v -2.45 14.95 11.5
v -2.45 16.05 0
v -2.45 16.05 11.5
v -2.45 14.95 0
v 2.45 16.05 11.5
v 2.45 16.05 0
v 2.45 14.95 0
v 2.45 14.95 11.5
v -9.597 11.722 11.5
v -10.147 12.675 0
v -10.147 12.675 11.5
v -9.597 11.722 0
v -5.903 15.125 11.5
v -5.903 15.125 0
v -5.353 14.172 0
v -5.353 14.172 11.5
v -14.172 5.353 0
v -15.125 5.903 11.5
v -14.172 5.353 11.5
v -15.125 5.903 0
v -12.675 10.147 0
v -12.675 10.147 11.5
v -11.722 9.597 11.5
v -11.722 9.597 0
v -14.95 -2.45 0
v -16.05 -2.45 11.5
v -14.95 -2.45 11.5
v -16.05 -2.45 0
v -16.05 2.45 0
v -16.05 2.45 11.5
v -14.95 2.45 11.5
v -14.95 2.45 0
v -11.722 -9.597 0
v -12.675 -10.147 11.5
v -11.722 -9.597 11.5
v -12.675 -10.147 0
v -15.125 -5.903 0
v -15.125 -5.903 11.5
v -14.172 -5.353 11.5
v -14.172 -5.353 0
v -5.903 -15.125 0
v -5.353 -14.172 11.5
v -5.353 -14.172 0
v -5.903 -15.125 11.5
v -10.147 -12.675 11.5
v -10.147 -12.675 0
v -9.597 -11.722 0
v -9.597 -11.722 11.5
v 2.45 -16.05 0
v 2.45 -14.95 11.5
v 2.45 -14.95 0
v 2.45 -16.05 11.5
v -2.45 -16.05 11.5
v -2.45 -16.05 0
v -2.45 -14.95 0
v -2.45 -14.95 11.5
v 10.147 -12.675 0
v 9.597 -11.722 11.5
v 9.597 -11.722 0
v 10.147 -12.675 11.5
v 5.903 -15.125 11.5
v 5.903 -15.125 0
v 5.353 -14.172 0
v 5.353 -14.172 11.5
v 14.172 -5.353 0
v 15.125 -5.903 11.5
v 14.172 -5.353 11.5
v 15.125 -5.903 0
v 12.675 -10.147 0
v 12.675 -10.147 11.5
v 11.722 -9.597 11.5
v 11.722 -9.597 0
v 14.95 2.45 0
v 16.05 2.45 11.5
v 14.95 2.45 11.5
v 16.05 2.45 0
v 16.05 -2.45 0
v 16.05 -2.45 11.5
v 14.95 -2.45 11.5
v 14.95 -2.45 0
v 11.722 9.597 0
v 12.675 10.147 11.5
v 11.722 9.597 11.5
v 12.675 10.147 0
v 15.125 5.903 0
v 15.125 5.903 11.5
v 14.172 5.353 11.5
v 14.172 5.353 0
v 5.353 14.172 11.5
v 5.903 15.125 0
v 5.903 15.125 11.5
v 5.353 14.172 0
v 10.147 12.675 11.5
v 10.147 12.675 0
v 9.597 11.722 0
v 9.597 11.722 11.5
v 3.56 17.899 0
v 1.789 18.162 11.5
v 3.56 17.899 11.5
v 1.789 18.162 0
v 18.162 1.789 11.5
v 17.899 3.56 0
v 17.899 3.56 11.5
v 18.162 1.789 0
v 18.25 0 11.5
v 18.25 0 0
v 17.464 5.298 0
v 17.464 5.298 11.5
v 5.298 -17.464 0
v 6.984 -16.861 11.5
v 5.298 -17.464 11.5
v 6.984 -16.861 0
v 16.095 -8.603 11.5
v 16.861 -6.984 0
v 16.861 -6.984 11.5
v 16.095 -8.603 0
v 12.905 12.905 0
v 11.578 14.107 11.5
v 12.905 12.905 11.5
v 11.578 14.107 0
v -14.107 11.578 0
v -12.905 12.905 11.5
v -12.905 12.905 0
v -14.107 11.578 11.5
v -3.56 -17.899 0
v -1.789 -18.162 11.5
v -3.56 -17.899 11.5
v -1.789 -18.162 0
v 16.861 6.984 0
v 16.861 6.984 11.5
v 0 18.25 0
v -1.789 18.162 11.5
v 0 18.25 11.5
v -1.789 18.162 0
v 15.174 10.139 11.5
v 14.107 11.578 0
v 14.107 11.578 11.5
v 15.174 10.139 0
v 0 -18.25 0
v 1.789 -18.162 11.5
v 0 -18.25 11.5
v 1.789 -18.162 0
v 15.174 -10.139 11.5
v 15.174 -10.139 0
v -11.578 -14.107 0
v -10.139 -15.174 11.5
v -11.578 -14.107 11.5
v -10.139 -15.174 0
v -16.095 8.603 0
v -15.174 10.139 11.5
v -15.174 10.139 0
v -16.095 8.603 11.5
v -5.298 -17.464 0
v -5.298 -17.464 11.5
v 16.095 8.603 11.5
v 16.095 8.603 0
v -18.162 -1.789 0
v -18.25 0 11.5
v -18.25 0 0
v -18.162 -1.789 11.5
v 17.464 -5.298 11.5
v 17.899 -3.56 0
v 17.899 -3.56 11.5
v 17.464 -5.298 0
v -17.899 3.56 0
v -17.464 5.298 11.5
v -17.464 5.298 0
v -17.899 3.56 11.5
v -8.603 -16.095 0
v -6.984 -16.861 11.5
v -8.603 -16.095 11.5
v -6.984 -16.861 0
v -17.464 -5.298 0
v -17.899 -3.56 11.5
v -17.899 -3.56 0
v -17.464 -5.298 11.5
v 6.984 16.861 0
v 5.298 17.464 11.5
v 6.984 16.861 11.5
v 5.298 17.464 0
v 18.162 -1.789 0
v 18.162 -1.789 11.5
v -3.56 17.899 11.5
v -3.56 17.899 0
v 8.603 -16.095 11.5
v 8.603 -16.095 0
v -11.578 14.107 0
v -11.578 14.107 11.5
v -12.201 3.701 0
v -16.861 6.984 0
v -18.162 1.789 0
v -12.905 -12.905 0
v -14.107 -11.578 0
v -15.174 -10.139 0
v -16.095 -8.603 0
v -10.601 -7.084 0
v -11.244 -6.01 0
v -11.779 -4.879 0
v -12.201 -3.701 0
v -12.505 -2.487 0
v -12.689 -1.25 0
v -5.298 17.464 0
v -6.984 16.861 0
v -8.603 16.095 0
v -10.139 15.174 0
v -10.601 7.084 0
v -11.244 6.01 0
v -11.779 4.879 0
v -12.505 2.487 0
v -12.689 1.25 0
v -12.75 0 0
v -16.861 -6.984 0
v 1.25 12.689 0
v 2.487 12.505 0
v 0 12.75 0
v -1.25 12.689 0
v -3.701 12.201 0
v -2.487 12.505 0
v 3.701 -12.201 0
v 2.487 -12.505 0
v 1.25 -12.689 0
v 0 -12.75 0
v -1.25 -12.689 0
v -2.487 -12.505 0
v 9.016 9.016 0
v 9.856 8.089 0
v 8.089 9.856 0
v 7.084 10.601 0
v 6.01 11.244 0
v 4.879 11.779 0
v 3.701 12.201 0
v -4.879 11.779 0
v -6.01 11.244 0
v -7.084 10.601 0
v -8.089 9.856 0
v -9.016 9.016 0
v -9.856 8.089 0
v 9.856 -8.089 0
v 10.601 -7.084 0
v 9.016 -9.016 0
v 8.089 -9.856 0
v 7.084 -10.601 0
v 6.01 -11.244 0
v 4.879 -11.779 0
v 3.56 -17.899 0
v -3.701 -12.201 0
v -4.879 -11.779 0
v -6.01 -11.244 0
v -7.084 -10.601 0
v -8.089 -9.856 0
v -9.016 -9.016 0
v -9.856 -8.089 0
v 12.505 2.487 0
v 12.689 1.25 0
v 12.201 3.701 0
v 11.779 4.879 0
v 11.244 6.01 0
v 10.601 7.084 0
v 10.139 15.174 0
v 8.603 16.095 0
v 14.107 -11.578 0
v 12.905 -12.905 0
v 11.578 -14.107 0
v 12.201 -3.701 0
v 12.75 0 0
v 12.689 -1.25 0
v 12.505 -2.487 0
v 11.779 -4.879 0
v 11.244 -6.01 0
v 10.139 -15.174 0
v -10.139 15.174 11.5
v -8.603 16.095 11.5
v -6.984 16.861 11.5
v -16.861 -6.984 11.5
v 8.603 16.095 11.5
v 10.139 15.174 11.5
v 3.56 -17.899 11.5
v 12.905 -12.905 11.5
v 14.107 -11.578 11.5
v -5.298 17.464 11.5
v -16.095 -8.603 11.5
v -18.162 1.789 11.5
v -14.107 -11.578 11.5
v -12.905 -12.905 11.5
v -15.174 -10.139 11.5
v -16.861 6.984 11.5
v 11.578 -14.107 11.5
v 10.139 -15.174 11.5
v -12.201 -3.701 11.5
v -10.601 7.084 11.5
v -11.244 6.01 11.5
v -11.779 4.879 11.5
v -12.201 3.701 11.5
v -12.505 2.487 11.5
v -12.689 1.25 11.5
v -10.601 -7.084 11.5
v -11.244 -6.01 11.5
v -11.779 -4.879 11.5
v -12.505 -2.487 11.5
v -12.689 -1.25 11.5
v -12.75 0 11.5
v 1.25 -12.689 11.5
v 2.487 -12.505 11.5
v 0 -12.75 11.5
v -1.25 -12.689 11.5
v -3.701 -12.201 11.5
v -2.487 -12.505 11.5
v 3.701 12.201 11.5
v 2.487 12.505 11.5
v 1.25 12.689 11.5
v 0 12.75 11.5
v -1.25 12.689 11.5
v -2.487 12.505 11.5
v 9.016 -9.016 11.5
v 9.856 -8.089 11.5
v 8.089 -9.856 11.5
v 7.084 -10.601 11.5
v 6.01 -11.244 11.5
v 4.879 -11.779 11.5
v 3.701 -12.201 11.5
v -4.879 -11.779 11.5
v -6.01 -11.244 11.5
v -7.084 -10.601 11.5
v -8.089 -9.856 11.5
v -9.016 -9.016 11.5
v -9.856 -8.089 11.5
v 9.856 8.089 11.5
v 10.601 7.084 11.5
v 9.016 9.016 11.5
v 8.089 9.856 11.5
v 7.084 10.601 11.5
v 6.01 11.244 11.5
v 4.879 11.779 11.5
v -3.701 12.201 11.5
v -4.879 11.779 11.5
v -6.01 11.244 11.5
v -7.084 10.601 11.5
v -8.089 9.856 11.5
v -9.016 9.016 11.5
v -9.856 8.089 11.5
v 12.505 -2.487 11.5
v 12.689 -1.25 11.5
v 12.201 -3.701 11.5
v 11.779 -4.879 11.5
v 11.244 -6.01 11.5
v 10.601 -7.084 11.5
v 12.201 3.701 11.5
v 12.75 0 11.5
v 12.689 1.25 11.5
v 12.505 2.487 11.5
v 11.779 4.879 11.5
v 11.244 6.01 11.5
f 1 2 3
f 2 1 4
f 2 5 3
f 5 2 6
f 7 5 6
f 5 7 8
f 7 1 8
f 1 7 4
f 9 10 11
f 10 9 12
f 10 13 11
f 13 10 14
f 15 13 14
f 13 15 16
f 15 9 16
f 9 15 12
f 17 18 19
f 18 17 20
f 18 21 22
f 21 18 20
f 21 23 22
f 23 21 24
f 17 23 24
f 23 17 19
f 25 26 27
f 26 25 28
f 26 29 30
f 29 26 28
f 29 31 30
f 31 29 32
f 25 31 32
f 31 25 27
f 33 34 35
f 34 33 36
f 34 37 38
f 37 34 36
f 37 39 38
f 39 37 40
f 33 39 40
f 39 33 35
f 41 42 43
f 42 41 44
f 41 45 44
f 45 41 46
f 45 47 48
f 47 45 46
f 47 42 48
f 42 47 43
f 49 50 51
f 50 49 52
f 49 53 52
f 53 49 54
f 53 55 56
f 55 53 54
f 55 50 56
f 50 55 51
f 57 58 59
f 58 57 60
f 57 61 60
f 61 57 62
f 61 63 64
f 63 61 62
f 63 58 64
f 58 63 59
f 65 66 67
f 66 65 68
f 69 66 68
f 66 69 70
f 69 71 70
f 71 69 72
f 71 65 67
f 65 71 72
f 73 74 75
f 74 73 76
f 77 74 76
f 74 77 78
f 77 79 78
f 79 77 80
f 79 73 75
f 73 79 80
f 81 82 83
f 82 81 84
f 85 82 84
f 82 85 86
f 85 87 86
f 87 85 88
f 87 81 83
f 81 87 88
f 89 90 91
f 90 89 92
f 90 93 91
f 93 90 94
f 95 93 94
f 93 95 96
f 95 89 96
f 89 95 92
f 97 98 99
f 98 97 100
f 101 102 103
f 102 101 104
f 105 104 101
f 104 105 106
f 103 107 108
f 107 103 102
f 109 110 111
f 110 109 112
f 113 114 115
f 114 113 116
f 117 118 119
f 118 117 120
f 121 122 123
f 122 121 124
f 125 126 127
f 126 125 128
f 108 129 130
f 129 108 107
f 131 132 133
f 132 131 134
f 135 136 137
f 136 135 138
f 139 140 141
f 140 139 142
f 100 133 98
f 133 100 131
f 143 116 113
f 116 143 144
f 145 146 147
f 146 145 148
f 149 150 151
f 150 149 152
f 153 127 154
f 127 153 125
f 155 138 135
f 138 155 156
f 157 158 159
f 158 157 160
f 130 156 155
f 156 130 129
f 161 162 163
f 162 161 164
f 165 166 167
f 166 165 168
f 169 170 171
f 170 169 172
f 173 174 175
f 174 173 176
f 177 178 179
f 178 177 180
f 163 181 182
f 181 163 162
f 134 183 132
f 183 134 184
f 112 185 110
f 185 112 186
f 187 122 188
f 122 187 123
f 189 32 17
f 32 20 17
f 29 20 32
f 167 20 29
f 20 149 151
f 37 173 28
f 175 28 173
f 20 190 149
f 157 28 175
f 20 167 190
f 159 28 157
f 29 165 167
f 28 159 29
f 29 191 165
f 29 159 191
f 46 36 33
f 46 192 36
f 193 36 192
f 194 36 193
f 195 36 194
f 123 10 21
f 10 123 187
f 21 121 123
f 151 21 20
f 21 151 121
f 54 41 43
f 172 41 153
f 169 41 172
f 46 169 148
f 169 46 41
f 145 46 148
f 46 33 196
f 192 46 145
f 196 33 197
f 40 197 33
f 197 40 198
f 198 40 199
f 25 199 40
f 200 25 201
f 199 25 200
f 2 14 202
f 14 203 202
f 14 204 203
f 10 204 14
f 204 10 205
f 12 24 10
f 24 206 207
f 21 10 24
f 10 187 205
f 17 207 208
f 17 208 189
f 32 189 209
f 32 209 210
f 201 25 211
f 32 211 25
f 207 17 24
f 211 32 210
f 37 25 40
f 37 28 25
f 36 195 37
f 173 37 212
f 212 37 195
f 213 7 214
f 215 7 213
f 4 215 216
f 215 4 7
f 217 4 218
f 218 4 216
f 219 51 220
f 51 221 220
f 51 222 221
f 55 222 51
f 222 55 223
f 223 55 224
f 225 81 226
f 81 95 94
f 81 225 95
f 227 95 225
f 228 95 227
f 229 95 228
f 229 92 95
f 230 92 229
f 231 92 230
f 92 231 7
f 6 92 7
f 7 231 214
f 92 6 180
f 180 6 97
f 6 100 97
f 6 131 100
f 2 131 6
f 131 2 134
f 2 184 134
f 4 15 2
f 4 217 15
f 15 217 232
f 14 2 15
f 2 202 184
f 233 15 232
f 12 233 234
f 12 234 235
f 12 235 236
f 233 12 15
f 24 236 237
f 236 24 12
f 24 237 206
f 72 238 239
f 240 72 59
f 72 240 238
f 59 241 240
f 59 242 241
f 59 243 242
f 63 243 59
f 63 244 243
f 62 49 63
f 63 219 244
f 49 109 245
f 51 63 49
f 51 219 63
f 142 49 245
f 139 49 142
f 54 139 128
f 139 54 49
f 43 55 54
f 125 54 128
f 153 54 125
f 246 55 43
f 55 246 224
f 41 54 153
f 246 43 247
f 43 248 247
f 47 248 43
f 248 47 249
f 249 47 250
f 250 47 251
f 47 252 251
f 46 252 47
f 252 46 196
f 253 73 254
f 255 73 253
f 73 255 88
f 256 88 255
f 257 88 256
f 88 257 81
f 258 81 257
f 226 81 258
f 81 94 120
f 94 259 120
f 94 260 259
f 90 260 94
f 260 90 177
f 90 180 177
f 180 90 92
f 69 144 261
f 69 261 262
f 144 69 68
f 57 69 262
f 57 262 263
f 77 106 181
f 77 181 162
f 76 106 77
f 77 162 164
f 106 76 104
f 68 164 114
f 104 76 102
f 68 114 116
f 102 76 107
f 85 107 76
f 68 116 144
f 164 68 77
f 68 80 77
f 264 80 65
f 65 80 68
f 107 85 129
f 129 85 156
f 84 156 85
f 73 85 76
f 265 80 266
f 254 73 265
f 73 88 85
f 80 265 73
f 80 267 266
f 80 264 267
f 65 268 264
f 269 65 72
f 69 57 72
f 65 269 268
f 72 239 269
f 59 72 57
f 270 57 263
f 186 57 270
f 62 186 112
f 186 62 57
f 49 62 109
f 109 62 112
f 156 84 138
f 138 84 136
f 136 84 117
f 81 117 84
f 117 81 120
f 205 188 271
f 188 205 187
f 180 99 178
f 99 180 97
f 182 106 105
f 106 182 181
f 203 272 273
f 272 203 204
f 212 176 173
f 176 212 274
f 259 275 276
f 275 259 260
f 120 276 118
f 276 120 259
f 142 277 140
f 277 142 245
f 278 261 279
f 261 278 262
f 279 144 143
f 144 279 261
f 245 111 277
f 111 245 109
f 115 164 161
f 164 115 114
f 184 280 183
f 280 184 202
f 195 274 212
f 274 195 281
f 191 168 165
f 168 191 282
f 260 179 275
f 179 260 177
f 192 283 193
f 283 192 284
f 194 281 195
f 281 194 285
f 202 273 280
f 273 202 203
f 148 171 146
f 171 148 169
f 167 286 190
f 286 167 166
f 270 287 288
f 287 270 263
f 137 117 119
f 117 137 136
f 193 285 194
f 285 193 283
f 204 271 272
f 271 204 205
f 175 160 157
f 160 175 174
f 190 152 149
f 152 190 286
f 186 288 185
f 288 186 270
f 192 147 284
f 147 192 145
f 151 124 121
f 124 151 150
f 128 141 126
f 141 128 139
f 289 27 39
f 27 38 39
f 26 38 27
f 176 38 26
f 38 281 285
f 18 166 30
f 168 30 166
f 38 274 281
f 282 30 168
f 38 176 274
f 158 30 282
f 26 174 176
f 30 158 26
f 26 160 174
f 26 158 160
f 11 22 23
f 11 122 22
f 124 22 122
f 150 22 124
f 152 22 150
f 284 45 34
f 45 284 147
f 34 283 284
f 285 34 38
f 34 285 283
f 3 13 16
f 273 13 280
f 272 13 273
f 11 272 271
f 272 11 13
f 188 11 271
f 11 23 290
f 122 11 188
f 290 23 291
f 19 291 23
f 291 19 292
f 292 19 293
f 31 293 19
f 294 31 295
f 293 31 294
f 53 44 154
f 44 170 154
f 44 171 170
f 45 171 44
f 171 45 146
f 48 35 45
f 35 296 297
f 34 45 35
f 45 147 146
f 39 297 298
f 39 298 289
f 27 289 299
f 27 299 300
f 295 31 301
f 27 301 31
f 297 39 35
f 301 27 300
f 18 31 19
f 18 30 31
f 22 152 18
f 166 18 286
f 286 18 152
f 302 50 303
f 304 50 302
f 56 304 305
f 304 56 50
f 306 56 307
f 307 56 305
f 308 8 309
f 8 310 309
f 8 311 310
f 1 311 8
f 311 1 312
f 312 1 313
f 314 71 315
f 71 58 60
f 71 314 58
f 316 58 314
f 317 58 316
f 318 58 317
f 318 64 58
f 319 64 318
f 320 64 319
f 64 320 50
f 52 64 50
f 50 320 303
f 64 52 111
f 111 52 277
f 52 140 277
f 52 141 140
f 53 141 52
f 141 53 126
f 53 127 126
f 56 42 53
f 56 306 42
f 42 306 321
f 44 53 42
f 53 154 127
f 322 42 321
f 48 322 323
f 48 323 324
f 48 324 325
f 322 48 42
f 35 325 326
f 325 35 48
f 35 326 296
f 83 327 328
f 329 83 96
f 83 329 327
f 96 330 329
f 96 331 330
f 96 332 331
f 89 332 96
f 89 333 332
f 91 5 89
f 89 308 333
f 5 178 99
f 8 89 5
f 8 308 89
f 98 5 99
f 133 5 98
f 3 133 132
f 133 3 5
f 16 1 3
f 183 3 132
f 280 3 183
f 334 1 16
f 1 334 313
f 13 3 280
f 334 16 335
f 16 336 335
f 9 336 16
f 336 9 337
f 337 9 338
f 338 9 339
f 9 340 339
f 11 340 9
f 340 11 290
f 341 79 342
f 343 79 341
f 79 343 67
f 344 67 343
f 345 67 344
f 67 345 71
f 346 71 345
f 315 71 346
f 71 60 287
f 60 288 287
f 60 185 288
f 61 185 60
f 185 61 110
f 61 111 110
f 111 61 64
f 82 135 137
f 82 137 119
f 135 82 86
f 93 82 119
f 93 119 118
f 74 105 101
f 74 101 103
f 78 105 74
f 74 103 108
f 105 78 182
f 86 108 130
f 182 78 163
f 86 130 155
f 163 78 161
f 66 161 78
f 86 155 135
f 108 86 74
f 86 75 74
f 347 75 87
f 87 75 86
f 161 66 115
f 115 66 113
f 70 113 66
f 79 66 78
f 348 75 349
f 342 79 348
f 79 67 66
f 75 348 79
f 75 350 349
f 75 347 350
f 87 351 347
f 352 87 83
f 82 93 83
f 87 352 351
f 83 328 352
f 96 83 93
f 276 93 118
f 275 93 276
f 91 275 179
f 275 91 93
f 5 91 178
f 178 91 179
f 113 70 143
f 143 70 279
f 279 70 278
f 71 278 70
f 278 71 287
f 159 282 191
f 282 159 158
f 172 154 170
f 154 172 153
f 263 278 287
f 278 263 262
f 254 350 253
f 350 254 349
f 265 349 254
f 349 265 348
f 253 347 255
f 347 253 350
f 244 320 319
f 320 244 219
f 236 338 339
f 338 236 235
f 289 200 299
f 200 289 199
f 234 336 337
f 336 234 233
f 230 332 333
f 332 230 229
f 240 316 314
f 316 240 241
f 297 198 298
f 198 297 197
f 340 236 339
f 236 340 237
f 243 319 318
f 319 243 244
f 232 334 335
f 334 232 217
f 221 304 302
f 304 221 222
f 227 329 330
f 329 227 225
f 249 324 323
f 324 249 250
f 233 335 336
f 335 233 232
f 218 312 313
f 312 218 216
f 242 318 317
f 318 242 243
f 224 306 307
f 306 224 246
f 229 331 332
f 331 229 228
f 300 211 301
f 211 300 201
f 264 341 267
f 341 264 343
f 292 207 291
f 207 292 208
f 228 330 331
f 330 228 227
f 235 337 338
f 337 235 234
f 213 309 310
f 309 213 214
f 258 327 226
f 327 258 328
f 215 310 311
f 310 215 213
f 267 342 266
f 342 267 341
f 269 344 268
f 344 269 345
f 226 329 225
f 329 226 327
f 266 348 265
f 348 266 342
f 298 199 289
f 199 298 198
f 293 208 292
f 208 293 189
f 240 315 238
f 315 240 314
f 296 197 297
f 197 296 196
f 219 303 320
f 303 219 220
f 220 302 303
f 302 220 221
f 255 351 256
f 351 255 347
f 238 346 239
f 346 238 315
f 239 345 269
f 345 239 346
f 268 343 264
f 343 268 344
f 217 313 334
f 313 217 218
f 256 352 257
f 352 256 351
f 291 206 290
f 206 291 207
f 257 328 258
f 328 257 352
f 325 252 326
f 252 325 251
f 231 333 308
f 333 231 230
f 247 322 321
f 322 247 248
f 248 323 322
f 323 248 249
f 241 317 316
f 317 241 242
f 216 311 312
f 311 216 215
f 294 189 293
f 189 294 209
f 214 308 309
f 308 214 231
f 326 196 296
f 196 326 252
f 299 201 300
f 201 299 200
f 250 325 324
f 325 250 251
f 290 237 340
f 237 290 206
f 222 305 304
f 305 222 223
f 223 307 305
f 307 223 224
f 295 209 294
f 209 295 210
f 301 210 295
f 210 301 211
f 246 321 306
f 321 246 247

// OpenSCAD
// Busy board enclosure - v2 encoder-ring LED carrier for D29-D40
// Render this file to generate busy_board_led_ring.stl. Print in PETG, flat
// on the bed as modelled, no supports.

include <_busy_board_enclosure.scad>

board_v3 = false;     // v2.0 board, 222 mm square
busy_board_led_ring();
